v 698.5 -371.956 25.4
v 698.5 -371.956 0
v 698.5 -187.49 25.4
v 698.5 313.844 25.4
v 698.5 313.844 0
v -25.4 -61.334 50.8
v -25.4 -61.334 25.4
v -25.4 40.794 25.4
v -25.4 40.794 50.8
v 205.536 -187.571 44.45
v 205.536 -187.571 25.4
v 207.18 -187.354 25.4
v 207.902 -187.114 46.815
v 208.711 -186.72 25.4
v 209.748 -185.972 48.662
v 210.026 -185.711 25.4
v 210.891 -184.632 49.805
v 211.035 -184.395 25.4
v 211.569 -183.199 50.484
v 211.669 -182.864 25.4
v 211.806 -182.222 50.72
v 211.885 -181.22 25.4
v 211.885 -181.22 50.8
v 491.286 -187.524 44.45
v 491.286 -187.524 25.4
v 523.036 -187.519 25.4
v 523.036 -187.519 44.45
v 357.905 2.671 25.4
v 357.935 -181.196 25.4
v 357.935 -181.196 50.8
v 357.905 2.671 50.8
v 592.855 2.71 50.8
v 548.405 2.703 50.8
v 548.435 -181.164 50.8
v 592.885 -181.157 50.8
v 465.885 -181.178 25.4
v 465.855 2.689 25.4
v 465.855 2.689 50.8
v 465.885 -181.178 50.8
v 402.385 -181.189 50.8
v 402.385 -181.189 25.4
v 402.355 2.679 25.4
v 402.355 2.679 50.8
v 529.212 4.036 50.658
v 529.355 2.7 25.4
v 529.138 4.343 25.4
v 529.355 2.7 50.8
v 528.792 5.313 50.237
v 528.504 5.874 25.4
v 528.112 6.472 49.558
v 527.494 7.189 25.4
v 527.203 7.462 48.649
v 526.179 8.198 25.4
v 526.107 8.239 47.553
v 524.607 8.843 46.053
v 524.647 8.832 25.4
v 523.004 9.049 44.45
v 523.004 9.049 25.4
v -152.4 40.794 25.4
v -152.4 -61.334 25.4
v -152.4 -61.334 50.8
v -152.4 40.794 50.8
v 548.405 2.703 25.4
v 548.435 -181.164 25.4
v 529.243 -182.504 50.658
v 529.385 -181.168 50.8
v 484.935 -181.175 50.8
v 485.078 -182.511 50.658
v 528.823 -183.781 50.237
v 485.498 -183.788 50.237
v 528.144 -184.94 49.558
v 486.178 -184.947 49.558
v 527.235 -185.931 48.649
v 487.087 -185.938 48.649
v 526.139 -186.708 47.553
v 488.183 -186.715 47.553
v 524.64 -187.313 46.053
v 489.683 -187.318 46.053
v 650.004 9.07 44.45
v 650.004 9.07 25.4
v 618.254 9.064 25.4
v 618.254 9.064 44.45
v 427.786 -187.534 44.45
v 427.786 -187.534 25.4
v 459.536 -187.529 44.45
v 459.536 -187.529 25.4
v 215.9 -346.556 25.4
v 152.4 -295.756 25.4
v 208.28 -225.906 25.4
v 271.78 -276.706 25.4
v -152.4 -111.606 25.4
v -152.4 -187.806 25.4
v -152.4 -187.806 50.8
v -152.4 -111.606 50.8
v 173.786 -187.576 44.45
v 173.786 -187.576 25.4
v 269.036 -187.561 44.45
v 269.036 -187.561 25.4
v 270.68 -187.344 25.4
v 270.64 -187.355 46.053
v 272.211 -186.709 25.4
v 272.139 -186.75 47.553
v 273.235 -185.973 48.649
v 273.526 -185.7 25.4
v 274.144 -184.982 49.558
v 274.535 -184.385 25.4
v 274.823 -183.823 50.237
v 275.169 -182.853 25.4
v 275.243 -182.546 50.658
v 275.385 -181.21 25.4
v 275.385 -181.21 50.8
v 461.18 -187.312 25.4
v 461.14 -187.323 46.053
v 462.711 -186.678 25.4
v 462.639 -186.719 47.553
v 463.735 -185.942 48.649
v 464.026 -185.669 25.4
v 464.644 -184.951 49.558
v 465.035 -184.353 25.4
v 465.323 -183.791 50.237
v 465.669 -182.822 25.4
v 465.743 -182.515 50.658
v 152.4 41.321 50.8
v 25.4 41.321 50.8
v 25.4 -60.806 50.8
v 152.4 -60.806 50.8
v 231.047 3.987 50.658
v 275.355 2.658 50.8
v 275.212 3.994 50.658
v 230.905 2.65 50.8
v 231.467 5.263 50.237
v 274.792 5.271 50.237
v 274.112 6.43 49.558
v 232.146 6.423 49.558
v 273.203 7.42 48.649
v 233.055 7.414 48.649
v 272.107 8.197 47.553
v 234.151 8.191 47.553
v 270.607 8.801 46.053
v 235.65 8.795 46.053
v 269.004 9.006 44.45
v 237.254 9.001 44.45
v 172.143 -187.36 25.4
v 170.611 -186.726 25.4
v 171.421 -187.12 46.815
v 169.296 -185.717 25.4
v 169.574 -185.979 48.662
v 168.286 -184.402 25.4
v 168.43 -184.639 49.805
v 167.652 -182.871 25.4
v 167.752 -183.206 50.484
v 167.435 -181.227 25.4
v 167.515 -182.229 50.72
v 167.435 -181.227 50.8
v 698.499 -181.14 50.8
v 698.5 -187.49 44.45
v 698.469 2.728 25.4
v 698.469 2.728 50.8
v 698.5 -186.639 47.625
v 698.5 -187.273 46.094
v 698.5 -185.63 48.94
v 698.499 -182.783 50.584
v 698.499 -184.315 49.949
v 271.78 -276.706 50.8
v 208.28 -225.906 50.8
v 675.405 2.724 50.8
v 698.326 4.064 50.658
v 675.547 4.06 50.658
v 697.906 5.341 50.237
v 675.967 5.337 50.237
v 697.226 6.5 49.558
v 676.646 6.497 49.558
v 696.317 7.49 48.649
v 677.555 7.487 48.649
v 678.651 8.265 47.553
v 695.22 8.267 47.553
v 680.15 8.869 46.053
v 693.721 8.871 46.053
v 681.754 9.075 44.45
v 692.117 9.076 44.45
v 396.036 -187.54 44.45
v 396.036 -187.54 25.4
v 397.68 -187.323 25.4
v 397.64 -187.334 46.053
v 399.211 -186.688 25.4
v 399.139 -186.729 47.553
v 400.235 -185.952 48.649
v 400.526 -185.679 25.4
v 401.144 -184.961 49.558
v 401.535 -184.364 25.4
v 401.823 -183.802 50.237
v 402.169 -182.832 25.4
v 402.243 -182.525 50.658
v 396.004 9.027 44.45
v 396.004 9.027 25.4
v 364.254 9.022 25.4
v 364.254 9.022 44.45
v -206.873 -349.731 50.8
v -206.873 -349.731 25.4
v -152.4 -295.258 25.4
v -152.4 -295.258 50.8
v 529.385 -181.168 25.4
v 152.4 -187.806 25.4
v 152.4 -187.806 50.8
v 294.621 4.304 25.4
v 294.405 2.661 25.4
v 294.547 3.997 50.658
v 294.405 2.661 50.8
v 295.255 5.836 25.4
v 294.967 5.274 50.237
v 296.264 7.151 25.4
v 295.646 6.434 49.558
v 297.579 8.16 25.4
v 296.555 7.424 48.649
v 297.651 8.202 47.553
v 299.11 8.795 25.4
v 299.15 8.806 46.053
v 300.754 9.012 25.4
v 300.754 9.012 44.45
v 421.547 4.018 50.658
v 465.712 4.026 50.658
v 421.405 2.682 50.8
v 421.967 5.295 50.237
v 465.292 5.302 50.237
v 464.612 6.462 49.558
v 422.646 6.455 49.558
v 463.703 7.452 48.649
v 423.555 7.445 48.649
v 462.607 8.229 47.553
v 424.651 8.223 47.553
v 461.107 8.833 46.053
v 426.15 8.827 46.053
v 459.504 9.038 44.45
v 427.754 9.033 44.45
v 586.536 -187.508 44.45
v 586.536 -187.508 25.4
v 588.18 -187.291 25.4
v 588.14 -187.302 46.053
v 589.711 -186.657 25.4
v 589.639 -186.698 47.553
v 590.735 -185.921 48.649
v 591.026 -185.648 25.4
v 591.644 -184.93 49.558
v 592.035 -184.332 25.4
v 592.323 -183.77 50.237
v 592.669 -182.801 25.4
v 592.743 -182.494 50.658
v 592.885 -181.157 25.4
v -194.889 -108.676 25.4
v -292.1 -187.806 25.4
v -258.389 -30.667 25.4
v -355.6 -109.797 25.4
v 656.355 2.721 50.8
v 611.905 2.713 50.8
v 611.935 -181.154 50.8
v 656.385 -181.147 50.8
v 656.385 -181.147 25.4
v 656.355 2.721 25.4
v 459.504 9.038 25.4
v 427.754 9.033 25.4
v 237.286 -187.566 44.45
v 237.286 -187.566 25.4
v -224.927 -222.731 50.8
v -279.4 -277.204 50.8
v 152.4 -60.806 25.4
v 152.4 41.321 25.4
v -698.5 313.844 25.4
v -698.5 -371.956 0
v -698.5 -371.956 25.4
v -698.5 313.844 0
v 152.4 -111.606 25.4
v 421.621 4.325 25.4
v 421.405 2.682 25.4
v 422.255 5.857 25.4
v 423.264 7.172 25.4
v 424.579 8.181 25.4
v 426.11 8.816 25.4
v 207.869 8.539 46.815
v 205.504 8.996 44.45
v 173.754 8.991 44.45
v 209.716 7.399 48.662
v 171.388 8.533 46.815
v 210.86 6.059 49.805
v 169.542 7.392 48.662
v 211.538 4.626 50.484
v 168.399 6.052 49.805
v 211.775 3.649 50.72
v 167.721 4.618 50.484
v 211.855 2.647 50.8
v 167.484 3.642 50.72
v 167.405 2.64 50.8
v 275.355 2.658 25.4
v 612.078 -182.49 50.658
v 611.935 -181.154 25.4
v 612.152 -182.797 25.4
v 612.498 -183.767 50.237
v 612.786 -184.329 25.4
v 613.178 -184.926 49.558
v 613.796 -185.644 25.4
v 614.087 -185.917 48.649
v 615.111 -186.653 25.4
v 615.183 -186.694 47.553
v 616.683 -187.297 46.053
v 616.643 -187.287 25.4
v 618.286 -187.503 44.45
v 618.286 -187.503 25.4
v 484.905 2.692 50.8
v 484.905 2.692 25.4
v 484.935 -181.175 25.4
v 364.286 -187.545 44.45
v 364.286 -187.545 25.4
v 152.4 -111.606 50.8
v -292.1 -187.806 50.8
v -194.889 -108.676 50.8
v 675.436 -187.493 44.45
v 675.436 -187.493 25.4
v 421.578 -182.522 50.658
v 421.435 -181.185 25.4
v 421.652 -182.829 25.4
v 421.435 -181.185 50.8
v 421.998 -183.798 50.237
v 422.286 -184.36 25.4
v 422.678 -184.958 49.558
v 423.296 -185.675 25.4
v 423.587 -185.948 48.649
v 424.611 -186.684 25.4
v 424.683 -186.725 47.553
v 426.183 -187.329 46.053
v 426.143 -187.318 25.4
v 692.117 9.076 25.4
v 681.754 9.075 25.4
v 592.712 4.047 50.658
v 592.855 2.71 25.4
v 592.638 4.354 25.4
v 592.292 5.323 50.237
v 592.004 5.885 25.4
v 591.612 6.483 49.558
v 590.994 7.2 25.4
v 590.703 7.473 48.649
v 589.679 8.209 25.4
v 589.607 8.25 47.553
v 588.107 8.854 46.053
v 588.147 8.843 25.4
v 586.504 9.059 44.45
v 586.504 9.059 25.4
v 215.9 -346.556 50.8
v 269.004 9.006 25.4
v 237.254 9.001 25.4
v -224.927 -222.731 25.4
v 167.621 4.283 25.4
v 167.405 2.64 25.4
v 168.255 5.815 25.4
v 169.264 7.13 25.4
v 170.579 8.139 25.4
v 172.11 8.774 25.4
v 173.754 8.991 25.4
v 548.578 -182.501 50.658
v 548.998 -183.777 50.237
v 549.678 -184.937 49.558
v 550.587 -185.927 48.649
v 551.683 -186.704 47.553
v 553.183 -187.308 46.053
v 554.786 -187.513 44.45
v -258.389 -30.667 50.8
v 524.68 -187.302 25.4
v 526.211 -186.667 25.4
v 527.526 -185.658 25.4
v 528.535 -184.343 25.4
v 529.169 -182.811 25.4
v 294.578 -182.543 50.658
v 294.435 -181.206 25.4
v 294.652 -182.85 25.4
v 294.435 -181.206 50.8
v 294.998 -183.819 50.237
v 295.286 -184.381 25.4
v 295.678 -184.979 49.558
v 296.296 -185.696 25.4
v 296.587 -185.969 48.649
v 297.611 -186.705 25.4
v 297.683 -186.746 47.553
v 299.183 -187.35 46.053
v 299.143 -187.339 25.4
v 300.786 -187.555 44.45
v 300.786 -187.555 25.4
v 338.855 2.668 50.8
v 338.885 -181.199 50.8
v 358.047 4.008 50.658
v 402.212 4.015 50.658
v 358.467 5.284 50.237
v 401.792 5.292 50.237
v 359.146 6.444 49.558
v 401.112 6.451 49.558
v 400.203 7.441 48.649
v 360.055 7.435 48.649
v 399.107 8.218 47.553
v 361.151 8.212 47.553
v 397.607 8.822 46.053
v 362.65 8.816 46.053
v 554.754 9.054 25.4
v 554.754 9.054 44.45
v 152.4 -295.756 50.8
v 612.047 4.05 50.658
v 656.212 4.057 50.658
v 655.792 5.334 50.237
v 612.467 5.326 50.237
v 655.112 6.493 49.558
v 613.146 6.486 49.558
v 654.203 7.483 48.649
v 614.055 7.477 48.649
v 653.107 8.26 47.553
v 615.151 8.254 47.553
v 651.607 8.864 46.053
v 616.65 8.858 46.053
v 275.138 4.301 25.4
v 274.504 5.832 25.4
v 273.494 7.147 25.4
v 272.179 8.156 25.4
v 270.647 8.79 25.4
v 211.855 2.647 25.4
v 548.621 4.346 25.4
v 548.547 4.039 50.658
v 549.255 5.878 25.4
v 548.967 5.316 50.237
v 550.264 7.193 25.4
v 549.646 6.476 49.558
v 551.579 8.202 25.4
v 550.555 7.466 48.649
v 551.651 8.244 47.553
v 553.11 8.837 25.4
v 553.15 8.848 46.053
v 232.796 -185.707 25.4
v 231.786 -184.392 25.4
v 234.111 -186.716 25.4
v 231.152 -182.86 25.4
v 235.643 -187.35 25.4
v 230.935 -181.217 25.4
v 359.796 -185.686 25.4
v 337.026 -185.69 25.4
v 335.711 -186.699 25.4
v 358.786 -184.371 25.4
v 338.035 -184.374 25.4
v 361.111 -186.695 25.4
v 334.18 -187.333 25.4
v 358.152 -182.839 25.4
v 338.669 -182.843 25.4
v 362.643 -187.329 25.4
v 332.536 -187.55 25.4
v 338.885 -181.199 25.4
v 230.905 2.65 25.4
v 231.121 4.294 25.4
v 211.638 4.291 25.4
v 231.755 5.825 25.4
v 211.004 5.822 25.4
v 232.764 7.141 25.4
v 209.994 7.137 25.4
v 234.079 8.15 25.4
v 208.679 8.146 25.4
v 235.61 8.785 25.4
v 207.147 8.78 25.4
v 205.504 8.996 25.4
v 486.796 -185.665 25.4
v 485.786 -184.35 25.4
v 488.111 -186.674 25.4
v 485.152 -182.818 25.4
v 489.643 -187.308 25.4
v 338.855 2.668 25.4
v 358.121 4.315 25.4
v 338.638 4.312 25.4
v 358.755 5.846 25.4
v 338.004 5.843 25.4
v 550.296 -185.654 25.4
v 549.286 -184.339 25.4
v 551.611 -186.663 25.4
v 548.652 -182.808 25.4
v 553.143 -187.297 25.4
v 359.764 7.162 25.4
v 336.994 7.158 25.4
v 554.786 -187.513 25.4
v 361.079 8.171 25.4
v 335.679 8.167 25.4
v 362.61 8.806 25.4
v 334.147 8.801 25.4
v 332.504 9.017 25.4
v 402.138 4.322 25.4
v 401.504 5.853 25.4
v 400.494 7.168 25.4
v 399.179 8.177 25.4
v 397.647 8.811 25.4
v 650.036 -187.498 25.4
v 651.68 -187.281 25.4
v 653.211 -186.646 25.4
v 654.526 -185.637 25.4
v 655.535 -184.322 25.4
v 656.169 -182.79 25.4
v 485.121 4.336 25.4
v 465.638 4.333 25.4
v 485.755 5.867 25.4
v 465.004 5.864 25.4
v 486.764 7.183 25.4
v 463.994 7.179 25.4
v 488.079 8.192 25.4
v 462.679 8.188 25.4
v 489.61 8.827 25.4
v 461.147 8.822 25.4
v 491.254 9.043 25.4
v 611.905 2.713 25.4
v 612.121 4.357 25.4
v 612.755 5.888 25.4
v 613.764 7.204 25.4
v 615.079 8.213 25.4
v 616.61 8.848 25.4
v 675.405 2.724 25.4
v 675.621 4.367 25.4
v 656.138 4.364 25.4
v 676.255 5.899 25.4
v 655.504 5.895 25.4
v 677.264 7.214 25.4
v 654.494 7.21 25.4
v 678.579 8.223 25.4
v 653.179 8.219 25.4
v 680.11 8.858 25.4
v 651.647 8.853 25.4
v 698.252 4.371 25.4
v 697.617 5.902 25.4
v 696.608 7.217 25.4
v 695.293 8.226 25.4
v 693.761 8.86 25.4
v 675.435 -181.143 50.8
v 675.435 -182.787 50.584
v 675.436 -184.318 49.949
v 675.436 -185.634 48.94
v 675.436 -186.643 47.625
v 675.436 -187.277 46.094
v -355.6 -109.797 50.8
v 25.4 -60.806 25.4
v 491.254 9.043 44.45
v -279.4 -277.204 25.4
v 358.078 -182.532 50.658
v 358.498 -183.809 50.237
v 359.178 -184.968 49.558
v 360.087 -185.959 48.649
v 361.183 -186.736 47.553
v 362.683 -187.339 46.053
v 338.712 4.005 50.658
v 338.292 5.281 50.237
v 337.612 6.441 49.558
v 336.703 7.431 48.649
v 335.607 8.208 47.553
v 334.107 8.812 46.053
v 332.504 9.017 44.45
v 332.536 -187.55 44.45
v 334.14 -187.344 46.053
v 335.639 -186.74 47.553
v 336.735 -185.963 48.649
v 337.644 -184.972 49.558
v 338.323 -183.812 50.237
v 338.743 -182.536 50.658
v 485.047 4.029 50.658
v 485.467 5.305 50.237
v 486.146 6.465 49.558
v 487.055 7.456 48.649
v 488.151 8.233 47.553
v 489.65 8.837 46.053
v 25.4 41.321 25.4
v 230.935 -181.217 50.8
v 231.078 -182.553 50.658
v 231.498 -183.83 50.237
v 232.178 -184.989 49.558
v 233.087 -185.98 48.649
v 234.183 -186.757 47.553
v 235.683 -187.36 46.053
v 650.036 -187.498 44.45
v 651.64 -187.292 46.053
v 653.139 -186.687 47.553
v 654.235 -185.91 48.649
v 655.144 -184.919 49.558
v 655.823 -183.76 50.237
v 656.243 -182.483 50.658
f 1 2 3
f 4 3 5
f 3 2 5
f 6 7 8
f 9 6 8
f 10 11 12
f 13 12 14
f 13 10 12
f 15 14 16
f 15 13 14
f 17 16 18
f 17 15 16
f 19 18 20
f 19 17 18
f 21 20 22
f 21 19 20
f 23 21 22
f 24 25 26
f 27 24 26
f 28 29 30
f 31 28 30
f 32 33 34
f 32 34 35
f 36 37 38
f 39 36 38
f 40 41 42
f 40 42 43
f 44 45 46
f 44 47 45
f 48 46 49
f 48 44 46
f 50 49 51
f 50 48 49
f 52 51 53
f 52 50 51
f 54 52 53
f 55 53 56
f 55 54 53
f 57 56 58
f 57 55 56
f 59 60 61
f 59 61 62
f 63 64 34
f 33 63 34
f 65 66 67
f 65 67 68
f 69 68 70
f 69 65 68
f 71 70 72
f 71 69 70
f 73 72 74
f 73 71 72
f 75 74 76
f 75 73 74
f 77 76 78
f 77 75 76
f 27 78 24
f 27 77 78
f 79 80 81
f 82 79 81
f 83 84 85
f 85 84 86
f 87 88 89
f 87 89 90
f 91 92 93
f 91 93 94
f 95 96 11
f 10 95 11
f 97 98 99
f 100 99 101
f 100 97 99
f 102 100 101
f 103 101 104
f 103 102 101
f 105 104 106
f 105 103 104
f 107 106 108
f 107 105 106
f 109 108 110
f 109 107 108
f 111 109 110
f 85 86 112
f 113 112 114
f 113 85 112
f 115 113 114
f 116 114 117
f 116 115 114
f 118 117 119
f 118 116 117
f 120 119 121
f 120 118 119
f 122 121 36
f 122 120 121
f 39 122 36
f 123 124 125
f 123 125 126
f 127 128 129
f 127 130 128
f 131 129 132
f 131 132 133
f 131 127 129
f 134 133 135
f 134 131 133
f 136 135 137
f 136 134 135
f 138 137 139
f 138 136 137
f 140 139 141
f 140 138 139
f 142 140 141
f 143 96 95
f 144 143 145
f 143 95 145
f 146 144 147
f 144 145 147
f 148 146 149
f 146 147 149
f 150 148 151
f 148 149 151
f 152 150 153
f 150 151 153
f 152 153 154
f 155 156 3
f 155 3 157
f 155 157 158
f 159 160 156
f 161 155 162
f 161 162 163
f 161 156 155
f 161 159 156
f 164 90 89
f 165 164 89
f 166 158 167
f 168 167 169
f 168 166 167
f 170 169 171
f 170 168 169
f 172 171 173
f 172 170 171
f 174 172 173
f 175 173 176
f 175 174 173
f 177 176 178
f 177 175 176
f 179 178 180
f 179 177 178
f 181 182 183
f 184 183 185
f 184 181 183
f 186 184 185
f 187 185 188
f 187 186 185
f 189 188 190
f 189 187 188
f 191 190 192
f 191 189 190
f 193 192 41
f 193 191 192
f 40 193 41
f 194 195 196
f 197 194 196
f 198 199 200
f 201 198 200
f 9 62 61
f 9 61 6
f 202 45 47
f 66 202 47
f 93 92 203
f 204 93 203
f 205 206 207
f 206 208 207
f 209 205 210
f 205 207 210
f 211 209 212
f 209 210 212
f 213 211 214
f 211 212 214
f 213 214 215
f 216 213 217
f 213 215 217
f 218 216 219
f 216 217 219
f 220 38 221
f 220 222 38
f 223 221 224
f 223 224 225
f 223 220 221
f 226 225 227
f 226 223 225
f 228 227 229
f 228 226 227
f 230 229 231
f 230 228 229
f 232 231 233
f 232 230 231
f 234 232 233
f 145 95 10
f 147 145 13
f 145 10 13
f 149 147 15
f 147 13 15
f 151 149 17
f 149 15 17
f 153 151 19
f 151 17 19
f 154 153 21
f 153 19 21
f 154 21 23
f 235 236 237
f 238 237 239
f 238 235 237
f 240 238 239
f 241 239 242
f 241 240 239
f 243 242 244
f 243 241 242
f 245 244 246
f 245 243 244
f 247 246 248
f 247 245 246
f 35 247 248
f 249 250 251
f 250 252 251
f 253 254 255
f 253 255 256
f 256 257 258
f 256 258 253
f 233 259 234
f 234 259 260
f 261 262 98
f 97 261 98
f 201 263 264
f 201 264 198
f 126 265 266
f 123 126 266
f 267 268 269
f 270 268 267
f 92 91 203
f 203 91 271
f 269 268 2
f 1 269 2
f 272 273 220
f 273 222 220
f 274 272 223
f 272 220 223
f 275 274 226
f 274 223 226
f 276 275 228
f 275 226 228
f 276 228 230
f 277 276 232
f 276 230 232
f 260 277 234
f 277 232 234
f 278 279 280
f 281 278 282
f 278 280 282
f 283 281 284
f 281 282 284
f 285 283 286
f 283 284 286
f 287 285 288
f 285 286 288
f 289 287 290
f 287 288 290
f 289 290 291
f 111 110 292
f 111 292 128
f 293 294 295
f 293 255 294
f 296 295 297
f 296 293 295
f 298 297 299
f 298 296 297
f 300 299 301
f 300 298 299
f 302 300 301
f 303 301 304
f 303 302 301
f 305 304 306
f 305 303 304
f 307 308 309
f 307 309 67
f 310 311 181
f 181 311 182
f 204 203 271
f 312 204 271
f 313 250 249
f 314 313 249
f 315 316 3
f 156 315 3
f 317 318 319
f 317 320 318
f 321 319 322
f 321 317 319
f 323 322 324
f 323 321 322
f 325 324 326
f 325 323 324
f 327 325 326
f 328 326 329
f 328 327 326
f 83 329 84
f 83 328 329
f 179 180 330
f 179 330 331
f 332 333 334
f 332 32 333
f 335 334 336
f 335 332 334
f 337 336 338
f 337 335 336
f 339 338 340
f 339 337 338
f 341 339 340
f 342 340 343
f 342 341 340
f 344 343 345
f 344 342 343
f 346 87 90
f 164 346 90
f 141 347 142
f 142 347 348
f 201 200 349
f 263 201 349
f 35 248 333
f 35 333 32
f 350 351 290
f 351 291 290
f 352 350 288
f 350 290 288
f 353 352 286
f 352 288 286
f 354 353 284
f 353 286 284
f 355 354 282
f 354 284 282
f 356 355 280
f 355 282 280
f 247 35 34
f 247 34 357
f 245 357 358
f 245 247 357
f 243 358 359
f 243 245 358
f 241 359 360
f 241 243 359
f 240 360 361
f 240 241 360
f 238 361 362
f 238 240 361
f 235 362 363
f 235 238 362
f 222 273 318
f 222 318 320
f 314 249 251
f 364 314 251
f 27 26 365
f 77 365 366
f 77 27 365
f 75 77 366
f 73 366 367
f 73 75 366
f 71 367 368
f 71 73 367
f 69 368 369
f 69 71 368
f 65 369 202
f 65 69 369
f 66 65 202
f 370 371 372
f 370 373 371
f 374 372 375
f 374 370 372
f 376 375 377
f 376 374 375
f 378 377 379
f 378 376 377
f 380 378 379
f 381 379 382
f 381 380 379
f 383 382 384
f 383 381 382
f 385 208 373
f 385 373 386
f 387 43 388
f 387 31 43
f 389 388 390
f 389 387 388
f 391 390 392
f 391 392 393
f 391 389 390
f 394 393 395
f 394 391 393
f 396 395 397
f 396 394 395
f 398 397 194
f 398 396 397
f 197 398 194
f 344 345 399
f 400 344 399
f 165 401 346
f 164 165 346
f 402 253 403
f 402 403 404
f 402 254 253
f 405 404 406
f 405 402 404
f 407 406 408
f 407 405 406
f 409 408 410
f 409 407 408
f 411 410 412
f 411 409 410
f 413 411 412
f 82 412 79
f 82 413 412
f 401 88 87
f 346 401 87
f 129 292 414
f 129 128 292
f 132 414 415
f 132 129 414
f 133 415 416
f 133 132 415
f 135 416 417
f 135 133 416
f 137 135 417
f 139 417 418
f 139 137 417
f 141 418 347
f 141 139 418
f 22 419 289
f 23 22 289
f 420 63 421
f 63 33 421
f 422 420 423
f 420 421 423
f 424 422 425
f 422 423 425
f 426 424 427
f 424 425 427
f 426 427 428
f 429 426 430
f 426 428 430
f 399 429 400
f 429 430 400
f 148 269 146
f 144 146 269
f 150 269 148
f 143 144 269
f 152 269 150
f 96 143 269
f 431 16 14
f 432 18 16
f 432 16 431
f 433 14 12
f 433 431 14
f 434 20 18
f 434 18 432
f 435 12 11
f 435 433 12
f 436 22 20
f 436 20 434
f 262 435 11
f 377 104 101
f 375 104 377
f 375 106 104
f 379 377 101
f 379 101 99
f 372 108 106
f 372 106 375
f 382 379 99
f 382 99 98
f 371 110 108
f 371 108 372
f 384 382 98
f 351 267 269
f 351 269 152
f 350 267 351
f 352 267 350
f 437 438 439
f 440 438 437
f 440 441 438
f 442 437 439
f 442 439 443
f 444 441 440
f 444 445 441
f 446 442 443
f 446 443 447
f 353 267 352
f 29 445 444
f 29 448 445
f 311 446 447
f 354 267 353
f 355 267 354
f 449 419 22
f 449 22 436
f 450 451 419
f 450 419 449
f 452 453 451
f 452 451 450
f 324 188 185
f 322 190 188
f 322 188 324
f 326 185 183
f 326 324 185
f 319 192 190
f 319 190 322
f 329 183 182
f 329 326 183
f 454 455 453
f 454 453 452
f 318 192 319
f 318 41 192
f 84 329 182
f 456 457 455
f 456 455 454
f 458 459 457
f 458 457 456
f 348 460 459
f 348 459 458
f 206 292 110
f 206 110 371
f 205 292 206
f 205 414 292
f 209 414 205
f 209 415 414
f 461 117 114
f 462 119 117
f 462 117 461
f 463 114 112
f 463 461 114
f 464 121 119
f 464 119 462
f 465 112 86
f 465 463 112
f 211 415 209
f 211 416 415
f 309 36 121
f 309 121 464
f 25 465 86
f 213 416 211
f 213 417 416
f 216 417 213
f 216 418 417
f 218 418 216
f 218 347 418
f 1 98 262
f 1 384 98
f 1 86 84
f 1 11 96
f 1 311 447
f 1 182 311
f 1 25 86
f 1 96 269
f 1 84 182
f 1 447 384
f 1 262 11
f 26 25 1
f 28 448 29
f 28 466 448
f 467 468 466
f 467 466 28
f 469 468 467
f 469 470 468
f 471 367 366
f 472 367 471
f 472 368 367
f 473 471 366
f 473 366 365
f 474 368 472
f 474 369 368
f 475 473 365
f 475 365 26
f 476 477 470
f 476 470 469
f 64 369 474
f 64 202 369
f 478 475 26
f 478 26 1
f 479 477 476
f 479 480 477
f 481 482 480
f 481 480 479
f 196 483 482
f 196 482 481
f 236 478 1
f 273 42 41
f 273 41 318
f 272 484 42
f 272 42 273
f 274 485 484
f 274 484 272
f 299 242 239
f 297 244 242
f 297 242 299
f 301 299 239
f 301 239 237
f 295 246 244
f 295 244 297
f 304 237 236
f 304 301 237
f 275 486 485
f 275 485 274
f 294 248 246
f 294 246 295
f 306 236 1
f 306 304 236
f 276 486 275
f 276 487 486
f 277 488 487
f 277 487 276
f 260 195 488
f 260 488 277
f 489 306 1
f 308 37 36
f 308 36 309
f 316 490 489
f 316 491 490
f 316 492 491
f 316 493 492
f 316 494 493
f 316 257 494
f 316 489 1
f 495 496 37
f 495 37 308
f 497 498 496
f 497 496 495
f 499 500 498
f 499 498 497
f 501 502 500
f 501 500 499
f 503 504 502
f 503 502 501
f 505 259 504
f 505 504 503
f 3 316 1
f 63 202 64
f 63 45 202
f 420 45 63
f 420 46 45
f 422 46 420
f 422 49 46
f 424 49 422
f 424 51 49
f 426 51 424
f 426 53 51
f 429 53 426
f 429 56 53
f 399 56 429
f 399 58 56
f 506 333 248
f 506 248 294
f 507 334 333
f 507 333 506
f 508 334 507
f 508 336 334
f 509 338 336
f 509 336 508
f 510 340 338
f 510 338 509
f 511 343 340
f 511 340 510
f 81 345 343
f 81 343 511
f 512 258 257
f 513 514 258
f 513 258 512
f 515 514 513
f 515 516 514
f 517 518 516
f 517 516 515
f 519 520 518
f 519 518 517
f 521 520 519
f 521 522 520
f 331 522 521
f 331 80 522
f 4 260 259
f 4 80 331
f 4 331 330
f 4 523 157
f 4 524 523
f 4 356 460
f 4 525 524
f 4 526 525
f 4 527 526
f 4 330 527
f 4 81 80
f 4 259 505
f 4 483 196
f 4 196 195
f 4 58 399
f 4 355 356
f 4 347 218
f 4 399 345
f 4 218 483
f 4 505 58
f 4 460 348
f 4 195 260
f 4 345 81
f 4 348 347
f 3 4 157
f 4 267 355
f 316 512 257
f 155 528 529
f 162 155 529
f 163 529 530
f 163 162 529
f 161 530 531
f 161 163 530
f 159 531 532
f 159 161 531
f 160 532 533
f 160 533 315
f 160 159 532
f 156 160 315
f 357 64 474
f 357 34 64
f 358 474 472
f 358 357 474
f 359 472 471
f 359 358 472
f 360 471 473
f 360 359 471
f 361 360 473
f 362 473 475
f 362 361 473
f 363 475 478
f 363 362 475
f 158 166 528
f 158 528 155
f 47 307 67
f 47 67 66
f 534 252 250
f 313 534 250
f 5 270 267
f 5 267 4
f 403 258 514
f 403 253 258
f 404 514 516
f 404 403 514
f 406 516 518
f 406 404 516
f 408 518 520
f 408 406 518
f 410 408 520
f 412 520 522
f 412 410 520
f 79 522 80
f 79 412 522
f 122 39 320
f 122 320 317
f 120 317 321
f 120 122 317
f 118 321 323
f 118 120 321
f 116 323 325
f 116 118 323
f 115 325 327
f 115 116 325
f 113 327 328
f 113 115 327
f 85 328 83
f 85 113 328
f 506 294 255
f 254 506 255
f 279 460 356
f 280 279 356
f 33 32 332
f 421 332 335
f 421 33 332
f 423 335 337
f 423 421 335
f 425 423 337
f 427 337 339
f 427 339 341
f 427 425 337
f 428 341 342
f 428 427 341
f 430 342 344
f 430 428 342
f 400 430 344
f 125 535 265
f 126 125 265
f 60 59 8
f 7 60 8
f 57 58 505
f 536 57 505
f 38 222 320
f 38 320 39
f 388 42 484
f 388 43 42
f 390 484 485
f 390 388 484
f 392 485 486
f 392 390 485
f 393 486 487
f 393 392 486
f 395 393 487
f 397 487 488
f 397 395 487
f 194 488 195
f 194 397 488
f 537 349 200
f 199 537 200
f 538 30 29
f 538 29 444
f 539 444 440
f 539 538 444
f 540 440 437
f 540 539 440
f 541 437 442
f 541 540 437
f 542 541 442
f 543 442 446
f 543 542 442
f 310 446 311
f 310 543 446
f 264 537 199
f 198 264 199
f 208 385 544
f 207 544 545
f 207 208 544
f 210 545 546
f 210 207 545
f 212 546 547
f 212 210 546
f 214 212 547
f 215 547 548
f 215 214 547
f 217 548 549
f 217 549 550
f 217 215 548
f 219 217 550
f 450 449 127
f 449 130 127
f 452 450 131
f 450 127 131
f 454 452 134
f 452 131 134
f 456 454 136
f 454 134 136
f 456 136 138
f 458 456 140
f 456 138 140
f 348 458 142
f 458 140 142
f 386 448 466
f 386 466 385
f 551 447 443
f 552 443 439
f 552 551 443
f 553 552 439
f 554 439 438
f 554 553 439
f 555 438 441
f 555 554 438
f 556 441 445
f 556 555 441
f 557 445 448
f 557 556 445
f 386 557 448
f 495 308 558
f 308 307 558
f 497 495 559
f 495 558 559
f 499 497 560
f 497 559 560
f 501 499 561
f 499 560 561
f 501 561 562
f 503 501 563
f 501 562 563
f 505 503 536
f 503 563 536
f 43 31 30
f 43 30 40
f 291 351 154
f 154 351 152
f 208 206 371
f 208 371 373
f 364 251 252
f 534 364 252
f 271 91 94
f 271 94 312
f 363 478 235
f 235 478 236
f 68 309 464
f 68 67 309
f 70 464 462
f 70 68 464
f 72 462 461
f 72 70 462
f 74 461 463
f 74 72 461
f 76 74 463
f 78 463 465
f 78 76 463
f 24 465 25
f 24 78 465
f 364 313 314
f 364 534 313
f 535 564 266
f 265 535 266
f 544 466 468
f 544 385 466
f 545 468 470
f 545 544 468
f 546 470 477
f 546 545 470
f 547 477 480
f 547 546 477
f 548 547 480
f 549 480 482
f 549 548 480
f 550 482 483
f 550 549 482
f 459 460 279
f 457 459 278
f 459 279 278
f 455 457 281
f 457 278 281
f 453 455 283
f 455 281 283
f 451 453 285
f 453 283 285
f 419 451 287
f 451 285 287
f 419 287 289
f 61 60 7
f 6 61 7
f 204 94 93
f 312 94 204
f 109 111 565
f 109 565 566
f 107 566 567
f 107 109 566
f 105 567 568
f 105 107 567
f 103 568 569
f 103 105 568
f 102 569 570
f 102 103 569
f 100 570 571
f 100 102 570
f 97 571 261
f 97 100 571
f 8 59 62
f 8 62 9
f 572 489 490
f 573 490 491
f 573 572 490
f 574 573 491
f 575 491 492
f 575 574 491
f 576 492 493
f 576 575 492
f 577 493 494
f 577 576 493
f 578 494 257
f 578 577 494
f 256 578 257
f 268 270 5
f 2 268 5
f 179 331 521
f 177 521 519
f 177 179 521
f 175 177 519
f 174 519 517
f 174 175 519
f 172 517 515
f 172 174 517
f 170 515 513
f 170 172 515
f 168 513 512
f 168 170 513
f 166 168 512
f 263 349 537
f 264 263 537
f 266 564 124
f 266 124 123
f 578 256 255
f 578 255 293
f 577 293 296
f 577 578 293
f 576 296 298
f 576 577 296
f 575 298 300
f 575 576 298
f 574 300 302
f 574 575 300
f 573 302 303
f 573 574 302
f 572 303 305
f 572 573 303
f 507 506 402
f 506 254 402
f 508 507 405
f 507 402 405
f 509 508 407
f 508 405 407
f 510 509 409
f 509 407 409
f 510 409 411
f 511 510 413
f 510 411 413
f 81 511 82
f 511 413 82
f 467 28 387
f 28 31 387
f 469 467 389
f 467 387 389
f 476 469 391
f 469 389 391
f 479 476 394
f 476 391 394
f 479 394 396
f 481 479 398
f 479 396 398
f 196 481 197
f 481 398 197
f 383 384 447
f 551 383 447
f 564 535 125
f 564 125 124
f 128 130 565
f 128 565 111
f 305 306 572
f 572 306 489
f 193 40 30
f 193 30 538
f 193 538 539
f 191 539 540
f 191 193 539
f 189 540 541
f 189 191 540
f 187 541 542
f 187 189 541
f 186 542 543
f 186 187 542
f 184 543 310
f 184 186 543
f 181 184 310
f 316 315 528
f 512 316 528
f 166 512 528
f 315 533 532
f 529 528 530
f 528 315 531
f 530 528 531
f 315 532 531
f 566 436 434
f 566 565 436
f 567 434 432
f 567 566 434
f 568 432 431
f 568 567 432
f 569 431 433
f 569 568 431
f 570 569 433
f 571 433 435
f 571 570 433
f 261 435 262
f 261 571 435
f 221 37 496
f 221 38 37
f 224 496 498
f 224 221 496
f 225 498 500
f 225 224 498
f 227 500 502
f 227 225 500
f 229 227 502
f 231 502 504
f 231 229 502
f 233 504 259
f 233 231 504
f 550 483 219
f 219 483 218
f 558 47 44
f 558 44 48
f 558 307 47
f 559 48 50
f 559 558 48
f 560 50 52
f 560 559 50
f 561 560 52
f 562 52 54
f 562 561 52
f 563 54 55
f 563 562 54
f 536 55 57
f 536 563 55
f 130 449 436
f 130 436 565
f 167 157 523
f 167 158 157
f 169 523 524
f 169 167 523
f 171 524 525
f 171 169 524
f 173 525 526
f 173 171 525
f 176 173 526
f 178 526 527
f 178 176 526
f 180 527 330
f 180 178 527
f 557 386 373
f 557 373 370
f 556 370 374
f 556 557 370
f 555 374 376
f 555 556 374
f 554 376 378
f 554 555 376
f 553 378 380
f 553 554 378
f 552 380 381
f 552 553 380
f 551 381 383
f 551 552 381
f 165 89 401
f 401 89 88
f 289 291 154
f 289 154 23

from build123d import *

# Parameters (mm, degrees)
F0_W     = 1397
F0_H     = 685.8
F1_DEPTH = 25.4
F2_W     = 304.8
F2_H     = 76.2
F3_DEPTH = 25.4
F2_W_2   = 127
F2_H_2   = 102.1273690268
F5_DEPTH = 25.4
F6_W     = 103.9362248944
F6_H     = 25.4
F6_W_2   = 19.05
F7_DEPTH = 203.2
F8_R     = 6.35


with BuildPart() as f1:
    # F0 (on Top) → F1 (new body)
    with BuildSketch(Plane.XY):
        with Locations((0, -29.0562831177)):
            Rectangle(F0_W, F0_H)
    extrude(amount=F1_DEPTH)

    # F4 (on face) → F5 (join)
    with BuildSketch(Plane.XY.offset(25.4)):
        Polygon((167.4362321558, -187.5774211861), (802.4362234732, -187.4724123998), (802.4037175289, 9.0947042382), (167.4037262115, 8.9896954519), align=None)
    extrude(amount=F5_DEPTH)

    # F6 (on face) → F7 (cut)
    with BuildSketch(Plane(origin=(0.0310239128, -187.605104679, 0), x_dir=(0.9999999863, 0.0001653682, 0), z_dir=(0.0001653682, -0.9999999863, 0))):
        with Locations((750.4370980848, 38.1)):
            Rectangle(F6_W, F6_H)
        with Locations((665.880210532, 38.1)):
            Rectangle(F6_W_2, F6_H)
        with Locations((602.380210532, 38.1)):
            Rectangle(F6_W_2, F6_H)
        with Locations((538.880210532, 38.1)):
            Rectangle(F6_W_2, F6_H)
        with Locations((475.380210532, 38.1)):
            Rectangle(F6_W_2, F6_H)
        with Locations((411.880210532, 38.1)):
            Rectangle(F6_W_2, F6_H)
        with Locations((348.380210532, 38.1)):
            Rectangle(F6_W_2, F6_H)
        with Locations((284.880210532, 38.1)):
            Rectangle(F6_W_2, F6_H)
        with Locations((221.380210532, 38.1)):
            Rectangle(F6_W_2, F6_H)
    extrude(amount=-F7_DEPTH, mode=Mode.SUBTRACT)

    # F8
    f8_edges = [f1.edges().sort_by_distance(p)[0] for p in [
        (189.661232, -187.573746, 50.8),
        (253.161231, -187.563245, 50.8),
        (316.66123, -187.552744, 50.8),
        (380.161229, -187.542243, 50.8),
        (443.661228, -187.531742, 50.8),
        (507.161228, -187.521241, 50.8),
        (570.661227, -187.510741, 50.8),
        (634.161226, -187.50024, 50.8),
        (634.12872, 9.066877, 50.8),
        (686.935607, 9.075609, 50.8),
        (686.968113, -187.491507, 50.8),
        (570.628721, 9.056376, 50.8),
        (507.128722, 9.045875, 50.8),
        (443.628722, 9.035374, 50.8),
        (189.628726, 8.993371, 50.8),
        (253.128725, 9.003872, 50.8),
        (316.628724, 9.014373, 50.8),
        (380.128723, 9.024873, 50.8),
        (167.436232, -187.577421, 38.1),
        (211.886232, -187.570071, 38.1),
        (230.936231, -187.56692, 38.1),
        (275.386231, -187.55957, 38.1),
        (294.43623, -187.556419, 38.1),
        (338.88623, -187.549069, 38.1),
        (357.93623, -187.545919, 38.1),
        (402.386229, -187.538568, 38.1),
        (421.436229, -187.535418, 38.1),
        (465.886228, -187.528067, 38.1),
        (484.936228, -187.524917, 38.1),
        (529.386227, -187.517566, 38.1),
        (548.436227, -187.514416, 38.1),
        (592.886226, -187.507065, 38.1),
        (611.936226, -187.503915, 38.1),
        (656.386225, -187.496564, 38.1),
        (211.853726, 8.997046, 38.1),
        (167.403726, 8.989695, 38.1),
        (230.903725, 9.000196, 38.1),
        (275.353725, 9.007547, 38.1),
        (294.403724, 9.010697, 38.1),
        (338.853724, 9.018048, 38.1),
        (357.903724, 9.021198, 38.1),
        (402.353723, 9.028549, 38.1),
        (421.403723, 9.031699, 38.1),
        (465.853722, 9.03905, 38.1),
        (484.903722, 9.0422, 38.1),
        (529.353721, 9.04955, 38.1),
        (548.403721, 9.052701, 38.1),
        (592.85372, 9.060051, 38.1),
        (611.90372, 9.063202, 38.1),
        (656.35372, 9.070552, 38.1),
        (675.403719, 9.073702, 38.1),
        (698.467494, 9.077516, 38.1),
    ]]
    fillet(f8_edges, radius=F8_R)


with BuildPart() as f3:
    # F2 (on face) → F3 (new body)
    with BuildSketch(Plane.XY.offset(25.4)):
        with Locations((0, -149.7062831177)):
            Rectangle(F2_W, F2_H)
    extrude(amount=F3_DEPTH)


with BuildPart() as f3b:
    # F2 (on face) → F3, piece 2 (new body)
    with BuildSketch(Plane.XY.offset(25.4)):
        Polygon((-292.1, -187.8062831177), (-194.8890785103, -108.6759320823), (-258.3890785103, -30.666755656), (-355.6, -109.7971066914), align=None)
    extrude(amount=F3_DEPTH)


with BuildPart() as f3c:
    # F2 (on face) → F3, piece 3 (new body)
    with BuildSketch(Plane.XY.offset(25.4)):
        with Locations((-88.9, -10.2699676311)):
            Rectangle(F2_W_2, F2_H_2)
    extrude(amount=F3_DEPTH)


with BuildPart() as f3d:
    # F2 (on face) → F3, piece 4 (new body)
    with BuildSketch(Plane.XY.offset(25.4)):
        with Locations((88.9, -9.7425986043)):
            Rectangle(F2_W_2, F2_H_2)
    extrude(amount=F3_DEPTH)


with BuildPart() as f3e:
    # F2 (on face) → F3, piece 5 (new body)
    with BuildSketch(Plane.XY.offset(25.4)):
        Polygon((-206.873130602, -349.7312831177), (-152.4, -295.2581525156), (-224.926869398, -222.7312831177), (-279.4, -277.2044137197), align=None)
    extrude(amount=F3_DEPTH)


with BuildPart() as f3f:
    # F2 (on face) → F3, piece 6 (new body)
    with BuildSketch(Plane.XY.offset(25.4)):
        Polygon((152.4, -295.7562831177), (215.9, -346.5562831177), (271.78, -276.7062831177), (208.28, -225.9062831177), align=None)
    extrude(amount=F3_DEPTH)


solid = Compound([f1.part, f3.part, f3b.part, f3c.part, f3d.part, f3e.part, f3f.part])
